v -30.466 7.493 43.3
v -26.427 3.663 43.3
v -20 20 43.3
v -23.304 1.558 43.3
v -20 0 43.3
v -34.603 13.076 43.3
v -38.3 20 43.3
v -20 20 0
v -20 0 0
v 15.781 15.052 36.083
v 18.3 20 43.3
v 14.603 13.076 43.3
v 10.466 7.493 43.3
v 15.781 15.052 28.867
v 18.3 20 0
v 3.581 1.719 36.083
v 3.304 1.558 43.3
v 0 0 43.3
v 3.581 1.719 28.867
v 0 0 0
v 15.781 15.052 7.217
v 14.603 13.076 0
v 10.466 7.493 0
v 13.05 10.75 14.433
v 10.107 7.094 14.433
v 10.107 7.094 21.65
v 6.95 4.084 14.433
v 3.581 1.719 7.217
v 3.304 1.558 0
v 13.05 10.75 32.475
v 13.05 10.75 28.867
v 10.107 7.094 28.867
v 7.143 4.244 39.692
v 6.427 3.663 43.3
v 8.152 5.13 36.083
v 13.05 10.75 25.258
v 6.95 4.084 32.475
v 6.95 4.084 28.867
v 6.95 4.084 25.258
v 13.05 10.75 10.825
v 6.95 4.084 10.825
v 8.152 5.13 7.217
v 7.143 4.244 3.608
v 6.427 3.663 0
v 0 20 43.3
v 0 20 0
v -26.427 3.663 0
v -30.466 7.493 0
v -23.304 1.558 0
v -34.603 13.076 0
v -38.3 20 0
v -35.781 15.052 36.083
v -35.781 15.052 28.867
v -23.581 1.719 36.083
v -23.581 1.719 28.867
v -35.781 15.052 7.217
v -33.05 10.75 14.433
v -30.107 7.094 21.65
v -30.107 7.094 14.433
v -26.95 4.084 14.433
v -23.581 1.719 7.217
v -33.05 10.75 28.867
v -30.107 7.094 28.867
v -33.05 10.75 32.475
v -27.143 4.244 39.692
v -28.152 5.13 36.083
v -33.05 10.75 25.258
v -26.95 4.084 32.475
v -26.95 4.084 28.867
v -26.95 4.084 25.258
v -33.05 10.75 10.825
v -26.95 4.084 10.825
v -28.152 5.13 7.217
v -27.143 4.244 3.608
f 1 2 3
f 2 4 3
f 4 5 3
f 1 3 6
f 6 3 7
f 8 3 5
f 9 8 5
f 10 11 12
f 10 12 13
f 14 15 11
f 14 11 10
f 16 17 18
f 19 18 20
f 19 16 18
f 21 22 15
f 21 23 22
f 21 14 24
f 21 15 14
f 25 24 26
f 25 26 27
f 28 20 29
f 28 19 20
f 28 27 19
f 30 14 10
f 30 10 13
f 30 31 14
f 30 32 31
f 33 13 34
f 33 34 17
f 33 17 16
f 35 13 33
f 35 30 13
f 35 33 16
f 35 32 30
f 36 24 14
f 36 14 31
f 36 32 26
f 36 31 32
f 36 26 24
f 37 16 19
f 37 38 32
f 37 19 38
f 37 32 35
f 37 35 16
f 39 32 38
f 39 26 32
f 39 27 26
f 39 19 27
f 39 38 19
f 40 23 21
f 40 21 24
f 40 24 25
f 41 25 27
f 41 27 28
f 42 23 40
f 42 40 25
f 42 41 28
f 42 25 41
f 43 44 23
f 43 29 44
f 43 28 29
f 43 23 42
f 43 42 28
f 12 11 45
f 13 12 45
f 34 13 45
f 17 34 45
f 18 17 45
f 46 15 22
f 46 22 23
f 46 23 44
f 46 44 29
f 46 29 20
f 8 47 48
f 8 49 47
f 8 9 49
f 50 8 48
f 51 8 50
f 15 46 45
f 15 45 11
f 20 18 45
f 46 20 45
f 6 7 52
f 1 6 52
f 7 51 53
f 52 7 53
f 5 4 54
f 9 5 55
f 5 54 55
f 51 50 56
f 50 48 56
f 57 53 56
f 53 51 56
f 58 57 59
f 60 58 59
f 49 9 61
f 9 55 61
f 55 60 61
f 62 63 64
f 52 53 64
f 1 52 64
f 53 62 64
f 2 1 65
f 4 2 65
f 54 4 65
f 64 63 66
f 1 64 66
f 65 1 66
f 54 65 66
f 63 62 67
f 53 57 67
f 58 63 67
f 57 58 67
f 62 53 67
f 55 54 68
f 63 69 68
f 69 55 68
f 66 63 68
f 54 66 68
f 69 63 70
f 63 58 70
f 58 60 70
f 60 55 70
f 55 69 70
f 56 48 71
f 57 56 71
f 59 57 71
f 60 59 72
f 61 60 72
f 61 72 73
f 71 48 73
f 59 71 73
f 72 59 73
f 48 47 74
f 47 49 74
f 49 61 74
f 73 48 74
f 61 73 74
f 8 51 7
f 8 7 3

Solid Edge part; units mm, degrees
sketch "Sketch1" plane through (0, 0, 0) normal (0, 0, 1) x (1, 0, 0)
  line L0 (0, 20) -> (18.3, 20)
  spline S0 degree 3 poles (18.3, 20) (13.4754, 9.4589) (7.3754, 2.7923) (0, 0) knots 0 0 0 0 1 1 1 1
  line L1 (0, 0) -> (0, 20)
extrude "Protrusion1" add sketch "Sketch1" along normal blind 43.3
mirror "Mirror1" about plane through (-10, 10, 21.65) normal (-1, 0, 0) of "Protrusion1"
